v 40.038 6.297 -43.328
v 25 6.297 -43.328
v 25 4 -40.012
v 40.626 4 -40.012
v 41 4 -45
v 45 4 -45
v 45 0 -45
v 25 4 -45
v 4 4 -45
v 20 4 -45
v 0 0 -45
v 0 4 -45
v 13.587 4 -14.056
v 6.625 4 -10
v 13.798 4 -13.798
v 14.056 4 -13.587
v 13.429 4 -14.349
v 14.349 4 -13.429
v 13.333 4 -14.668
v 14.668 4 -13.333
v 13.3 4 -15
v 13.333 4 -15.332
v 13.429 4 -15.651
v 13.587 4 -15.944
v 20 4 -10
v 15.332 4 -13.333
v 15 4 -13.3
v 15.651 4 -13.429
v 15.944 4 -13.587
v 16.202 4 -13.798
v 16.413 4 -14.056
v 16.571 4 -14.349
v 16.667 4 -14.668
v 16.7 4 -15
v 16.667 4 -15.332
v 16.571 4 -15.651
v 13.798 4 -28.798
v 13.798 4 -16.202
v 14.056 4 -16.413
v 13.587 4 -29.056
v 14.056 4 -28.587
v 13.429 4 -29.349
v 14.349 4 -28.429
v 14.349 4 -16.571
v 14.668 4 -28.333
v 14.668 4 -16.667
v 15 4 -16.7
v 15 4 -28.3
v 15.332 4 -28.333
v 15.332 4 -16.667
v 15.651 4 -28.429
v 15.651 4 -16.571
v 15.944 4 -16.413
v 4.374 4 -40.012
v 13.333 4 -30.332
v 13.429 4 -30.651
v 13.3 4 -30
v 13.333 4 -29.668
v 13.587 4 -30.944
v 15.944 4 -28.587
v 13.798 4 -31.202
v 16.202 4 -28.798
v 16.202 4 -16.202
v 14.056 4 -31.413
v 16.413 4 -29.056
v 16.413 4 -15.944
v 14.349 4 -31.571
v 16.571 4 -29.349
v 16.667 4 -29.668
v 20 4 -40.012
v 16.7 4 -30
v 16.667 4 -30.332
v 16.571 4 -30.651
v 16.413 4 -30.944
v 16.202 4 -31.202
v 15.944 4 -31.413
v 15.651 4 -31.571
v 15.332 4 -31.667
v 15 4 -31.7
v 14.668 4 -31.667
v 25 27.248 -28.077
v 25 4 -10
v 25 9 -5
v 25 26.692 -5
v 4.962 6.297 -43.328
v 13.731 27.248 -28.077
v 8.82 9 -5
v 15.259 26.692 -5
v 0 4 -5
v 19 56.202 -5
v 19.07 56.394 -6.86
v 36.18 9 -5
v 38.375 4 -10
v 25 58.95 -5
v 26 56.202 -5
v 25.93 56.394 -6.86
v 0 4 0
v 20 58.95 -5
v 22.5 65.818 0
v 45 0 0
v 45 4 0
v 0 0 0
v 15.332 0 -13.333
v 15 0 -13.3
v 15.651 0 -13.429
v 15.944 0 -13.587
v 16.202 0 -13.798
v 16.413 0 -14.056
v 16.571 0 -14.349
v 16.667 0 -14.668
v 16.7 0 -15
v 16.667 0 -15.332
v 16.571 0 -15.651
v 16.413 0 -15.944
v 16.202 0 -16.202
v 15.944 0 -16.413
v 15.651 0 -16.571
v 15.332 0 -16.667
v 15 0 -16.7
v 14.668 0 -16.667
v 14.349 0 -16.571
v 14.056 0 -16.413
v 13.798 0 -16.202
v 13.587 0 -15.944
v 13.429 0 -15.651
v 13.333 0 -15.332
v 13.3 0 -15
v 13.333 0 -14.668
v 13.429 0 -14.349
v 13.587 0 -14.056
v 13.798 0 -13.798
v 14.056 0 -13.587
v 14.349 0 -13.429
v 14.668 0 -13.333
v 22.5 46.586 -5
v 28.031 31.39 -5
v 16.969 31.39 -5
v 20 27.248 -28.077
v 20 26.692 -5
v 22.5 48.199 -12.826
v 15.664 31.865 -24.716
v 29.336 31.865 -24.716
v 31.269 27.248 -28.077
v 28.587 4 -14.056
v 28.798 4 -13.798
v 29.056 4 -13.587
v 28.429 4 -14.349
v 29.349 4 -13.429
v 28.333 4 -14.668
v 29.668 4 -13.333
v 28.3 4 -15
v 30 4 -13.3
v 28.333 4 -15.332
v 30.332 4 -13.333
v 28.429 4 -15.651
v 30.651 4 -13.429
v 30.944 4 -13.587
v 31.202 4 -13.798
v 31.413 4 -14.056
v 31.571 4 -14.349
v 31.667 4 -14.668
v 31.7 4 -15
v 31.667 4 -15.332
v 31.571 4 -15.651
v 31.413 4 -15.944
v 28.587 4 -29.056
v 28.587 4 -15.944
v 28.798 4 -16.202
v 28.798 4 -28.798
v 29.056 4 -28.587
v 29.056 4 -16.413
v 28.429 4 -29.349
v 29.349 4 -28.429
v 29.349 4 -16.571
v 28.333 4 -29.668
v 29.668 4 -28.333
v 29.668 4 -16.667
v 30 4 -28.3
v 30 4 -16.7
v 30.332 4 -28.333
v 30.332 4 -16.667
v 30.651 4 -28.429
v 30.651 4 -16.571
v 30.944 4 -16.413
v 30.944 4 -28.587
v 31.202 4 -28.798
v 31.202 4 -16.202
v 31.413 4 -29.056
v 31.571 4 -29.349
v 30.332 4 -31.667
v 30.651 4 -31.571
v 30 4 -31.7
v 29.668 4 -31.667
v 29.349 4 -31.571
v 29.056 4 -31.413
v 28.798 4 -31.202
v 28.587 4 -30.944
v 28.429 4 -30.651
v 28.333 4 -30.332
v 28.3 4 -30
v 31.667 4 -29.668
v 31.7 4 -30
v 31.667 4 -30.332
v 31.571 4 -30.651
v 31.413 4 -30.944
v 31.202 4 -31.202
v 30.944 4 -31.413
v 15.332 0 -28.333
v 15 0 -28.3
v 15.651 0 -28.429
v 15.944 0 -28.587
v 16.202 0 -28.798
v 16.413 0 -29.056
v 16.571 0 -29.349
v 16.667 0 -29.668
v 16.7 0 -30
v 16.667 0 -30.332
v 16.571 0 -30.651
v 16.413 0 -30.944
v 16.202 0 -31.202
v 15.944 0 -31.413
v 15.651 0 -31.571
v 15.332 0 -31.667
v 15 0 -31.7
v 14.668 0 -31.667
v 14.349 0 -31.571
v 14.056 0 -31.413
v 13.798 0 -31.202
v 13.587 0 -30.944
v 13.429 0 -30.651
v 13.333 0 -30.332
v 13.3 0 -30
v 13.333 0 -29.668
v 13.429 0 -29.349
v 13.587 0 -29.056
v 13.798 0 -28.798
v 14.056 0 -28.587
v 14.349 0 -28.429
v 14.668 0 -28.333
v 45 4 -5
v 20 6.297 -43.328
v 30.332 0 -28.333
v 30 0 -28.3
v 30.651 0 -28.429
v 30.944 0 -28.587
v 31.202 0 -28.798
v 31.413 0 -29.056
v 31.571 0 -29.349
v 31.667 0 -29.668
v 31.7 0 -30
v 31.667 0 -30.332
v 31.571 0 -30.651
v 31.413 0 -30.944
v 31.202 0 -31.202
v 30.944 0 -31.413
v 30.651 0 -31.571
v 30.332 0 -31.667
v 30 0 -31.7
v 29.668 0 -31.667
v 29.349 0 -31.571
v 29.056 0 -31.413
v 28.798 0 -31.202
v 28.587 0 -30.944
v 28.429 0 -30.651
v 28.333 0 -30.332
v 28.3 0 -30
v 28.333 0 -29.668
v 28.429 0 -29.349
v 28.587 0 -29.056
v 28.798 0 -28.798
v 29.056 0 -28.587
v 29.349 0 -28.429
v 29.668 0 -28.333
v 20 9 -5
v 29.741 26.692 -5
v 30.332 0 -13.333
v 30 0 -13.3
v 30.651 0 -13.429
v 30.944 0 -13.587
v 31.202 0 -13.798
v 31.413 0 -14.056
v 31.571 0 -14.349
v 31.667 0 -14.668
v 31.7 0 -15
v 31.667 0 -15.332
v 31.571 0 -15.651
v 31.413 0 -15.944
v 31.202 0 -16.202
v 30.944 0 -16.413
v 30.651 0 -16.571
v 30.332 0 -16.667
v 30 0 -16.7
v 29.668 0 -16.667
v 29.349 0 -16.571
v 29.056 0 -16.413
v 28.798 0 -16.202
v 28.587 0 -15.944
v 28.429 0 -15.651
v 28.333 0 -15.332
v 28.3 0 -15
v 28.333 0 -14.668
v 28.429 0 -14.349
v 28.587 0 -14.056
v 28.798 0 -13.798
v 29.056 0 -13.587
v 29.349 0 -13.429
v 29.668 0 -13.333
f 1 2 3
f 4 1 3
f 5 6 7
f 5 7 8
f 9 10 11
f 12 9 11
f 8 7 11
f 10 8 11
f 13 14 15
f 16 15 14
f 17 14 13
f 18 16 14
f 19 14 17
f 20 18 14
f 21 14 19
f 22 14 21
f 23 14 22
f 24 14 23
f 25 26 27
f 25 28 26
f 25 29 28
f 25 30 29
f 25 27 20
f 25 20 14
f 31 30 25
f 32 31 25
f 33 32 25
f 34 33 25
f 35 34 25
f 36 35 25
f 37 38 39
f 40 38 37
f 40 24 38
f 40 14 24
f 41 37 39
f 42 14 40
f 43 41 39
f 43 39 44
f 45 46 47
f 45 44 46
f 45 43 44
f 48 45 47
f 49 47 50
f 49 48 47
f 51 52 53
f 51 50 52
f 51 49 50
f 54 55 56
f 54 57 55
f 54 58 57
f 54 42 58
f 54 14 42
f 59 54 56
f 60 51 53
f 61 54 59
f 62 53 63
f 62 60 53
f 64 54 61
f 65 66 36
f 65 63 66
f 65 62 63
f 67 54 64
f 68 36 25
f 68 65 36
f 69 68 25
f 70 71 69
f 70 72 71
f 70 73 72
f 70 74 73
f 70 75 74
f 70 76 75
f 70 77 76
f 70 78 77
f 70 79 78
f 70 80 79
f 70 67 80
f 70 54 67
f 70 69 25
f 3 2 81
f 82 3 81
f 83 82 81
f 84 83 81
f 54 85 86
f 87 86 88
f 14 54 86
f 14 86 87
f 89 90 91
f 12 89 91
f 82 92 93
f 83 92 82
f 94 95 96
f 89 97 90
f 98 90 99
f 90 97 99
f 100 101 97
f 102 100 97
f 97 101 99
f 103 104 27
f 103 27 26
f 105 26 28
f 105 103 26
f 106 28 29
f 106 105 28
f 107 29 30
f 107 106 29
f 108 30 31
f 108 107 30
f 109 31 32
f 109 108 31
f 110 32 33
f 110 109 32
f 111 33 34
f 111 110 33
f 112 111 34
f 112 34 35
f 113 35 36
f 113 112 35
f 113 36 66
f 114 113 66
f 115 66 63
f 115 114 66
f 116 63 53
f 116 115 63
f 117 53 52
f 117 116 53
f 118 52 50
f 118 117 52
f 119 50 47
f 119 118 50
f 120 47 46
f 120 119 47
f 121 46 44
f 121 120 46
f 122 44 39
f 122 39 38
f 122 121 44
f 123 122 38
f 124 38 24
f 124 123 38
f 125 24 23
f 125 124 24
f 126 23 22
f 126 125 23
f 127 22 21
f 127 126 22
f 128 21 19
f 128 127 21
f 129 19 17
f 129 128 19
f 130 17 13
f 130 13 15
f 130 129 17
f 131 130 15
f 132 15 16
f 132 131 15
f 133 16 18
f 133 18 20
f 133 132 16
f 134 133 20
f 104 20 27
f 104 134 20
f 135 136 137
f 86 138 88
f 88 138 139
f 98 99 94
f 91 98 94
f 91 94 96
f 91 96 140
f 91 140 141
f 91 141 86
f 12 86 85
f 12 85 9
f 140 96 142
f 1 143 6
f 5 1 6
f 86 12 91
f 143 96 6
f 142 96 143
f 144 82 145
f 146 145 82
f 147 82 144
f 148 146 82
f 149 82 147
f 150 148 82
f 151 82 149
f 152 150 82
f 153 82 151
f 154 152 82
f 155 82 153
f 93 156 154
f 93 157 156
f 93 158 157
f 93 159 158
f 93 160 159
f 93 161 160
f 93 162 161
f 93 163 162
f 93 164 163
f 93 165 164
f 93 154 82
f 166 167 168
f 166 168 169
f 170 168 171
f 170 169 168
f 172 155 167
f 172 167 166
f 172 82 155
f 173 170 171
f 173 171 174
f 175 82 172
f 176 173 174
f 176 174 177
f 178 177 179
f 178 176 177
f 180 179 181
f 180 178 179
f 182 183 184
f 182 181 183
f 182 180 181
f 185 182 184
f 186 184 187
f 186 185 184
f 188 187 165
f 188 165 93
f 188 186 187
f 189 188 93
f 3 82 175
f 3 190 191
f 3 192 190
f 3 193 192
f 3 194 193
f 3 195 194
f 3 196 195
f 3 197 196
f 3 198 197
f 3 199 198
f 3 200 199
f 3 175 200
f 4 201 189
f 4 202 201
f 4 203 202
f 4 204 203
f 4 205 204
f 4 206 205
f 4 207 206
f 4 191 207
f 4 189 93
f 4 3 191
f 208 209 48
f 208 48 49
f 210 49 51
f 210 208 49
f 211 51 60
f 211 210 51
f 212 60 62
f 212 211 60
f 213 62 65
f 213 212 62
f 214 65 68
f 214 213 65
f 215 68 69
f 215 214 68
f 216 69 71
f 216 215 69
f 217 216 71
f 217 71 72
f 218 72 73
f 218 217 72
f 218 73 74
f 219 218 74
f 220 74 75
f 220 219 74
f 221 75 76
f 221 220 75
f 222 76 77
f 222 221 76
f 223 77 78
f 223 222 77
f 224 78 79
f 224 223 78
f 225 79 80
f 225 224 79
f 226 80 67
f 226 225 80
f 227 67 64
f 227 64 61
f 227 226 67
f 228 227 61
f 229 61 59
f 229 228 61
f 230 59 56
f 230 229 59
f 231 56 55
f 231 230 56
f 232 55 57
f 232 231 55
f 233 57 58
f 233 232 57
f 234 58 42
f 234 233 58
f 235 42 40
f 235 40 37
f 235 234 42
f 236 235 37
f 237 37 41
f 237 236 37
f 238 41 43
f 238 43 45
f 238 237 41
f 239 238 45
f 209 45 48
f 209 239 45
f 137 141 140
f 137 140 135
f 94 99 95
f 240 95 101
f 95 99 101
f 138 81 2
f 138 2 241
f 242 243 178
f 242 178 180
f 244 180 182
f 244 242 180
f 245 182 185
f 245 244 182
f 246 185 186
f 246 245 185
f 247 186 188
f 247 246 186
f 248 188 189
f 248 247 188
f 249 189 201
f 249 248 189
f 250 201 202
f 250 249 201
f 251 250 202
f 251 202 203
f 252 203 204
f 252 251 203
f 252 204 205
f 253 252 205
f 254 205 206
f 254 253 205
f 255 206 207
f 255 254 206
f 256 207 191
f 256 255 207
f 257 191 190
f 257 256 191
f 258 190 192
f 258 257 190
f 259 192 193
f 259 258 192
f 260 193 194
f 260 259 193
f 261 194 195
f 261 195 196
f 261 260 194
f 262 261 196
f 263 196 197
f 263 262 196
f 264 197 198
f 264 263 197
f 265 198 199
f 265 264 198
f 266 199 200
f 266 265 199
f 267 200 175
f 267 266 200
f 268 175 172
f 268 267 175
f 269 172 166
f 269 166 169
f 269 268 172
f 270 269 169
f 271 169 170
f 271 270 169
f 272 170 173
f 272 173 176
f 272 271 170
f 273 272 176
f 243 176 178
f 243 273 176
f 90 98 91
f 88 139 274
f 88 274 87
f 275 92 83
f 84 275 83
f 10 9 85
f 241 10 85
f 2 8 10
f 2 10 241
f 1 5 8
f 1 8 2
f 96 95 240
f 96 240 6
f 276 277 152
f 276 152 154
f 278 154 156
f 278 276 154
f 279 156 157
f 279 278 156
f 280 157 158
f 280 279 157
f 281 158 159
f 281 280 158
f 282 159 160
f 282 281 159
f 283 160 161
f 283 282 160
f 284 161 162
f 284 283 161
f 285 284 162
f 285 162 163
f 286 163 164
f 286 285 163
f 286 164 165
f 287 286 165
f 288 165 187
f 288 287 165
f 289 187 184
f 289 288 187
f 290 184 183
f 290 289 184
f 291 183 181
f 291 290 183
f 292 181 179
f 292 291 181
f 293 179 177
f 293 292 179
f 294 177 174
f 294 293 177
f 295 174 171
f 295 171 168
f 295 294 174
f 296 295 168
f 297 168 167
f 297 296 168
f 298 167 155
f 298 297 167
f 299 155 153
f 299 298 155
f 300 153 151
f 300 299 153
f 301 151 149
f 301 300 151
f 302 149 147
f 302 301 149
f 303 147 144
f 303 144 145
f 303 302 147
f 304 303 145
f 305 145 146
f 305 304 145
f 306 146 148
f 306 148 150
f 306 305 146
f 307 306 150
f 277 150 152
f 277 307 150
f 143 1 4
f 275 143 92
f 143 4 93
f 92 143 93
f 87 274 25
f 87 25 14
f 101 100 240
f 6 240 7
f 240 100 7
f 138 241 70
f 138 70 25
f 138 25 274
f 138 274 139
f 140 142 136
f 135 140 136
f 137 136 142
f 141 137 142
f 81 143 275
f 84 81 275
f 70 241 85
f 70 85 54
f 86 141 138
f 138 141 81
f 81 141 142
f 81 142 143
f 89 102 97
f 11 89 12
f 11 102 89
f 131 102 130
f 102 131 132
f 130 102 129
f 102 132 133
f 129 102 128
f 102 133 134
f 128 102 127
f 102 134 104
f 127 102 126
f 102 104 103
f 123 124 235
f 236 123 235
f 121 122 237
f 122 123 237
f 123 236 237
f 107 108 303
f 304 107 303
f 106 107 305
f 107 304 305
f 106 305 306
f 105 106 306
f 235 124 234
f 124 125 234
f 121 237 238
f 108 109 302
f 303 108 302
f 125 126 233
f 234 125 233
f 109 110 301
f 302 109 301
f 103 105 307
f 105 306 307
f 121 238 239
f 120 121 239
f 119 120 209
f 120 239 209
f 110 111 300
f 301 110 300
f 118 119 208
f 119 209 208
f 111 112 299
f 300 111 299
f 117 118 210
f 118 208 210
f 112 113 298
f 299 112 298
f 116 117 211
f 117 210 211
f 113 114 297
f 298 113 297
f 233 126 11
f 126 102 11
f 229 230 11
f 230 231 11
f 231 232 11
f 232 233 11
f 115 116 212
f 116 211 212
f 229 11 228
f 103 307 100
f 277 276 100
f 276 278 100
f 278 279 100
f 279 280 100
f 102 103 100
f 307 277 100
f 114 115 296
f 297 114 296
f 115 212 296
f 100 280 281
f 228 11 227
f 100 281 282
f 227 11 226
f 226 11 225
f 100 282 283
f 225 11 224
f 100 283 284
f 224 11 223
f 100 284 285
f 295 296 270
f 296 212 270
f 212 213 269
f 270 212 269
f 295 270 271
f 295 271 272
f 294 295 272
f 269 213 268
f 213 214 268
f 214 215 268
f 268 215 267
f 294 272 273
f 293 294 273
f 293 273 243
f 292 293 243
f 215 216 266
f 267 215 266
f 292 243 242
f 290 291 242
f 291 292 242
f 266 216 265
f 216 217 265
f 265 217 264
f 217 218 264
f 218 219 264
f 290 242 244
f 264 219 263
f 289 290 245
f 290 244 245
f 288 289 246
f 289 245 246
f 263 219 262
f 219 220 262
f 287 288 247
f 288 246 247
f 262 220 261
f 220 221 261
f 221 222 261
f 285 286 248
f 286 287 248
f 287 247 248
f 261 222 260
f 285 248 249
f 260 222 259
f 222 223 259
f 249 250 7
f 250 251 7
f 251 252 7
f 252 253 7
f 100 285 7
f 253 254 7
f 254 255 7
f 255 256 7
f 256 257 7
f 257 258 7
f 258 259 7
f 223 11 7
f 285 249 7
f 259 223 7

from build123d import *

# Parameters (mm, degrees)
SKETCH_1_W          = 45
SKETCH_1_H          = 45
SKETCH_1_R          = 1.7
EXTRUDE_1_DEPTH     = 4
EXTRUDE_2_DEPTH     = 5
EXTRUDE_3_DEPTH     = 65.785596942
EXTRUDE_4_DEPTH     = 65.785596942
CUT_EXTRUDE_1_DEPTH = 92.553486945
CUT_EXTRUDE_2_DEPTH = 85.512691631
EXTRUDE_9_REACH     = 86.713
CHAMFER_1_SIZE      = 5
EXTRUDE_10_REACH    = 86.713
EXTRUDE_11_REACH    = 88.671
SKETCH_13_W         = 5
SKETCH_13_H         = 28.755225939


with BuildPart() as part:
    # 草图1 → 凸台-拉伸1 (new body)
    with BuildSketch(Plane(origin=(0, 0, 0), x_dir=(1, 0, 0), z_dir=(0, 1, 0))):
        with Locations((22.5, 22.5)):
            Rectangle(SKETCH_1_W, SKETCH_1_H)
        with Locations(Location((15, 30, 0), (0, 0, 270))):
            Circle(SKETCH_1_R, mode=Mode.SUBTRACT)
        with Locations(Location((30, 30, 0), (0, 0, 270))):
            Circle(SKETCH_1_R, mode=Mode.SUBTRACT)
        with Locations(Location((15, 15, 0), (0, 0, 270))):
            Circle(SKETCH_1_R, mode=Mode.SUBTRACT)
        with Locations(Location((30, 15, 0), (0, 0, 270))):
            Circle(SKETCH_1_R, mode=Mode.SUBTRACT)
    extrude(amount=EXTRUDE_1_DEPTH)

    # 草图2 → 凸台-拉伸2 (add)
    with BuildSketch(Plane.XY):
        Polygon((0, 4), (22.5, 65.818241938), (45, 4), align=None)
    extrude(amount=-EXTRUDE_2_DEPTH)

    # 草图3 → 凸台-拉伸3 (add, along a direction that is not the sketch's normal)
    with BuildSketch(Plane(origin=(0, 4, 0), x_dir=(1, 0, 0), z_dir=(0, 1, 0))):
        Polygon((0, 5), (0, 45), (4, 45), (7, 5), align=None)
    extrude(amount=EXTRUDE_3_DEPTH, dir=(0.34202014332566566, 0.9396926207859095, 0))

    # 草图4 → 凸台-拉伸4 (add, along a direction that is not the sketch's normal)
    with BuildSketch(Plane(origin=(0, 4, 0), x_dir=(1, 0, 0), z_dir=(0, 1, 0))):
        Polygon((45, 45), (41, 45), (38, 5), (45, 5), align=None)
    extrude(amount=EXTRUDE_4_DEPTH, dir=(-0.3420201433256661, 0.9396926207859094, 0))

    # 草图5 → 切除-拉伸1 (cut, through all)
    with BuildSketch(Plane.XY):
        Polygon((22.5, 65.818241938), (19, 56.20207097), (11, 56.20207097), (11, 66.20207097), (34, 66.20207097), (34, 56.20207097), (26, 56.20207097), align=None)
    extrude(amount=-CUT_EXTRUDE_1_DEPTH, mode=Mode.SUBTRACT)

    # 草图6 → 切除-拉伸2 (cut, through all, along a direction that is not the sketch's normal)
    with BuildSketch(Plane(origin=(41.02157519, 14.930632332, 0), x_dir=(0, 0, -1), z_dir=(0.9396926207859093, 0.3420201433256662, 0))):
        Polygon((0, 54.153463037), (45, -11.632135967), (45, 54.153463037), align=None)
    extrude(amount=-CUT_EXTRUDE_2_DEPTH, dir=(1, 0, 0), mode=Mode.SUBTRACT)

    # 凸台-拉伸9: up to this plane
    extrude_9_end = Plane(origin=(26.5, 65.818241938, -45), z_dir=(-0.9373675520499937, 0.34117388751316935, 0.07030256640374952))
    # 草图8 → 凸台-拉伸9 (add, up to the surface)
    with BuildSketch(Plane(origin=(34.338725854, 12.498274094, 2.575404439), x_dir=(-0.06606280287191471, -0.024044893837572568, 0.9975257135317598), z_dir=(-0.9373675520499937, -0.34117388751316985, -0.07030256640374943)), mode=Mode.PRIVATE) as extrude_9_sk1:
        Polygon((-47.693411602, -10.264055393), (-46.016852855, -7.776255006), (-42.693411602, -10.136115185), align=None)
    extrude_9_tool1 = split(extrude(extrude_9_sk1.sketch, amount=EXTRUDE_9_REACH, dir=(-1, 0, 0), mode=Mode.PRIVATE), bisect_by=extrude_9_end, keep=Keep.BOTH, mode=Mode.PRIVATE)
    add(extrude_9_tool1.solids().sort_by_distance((40.554764, 4.765818, -42.779987))[0])

    # 倒角1
    chamfer_1_edges = [part.edges().sort_by_distance(p)[0] for p in [
        (22.5, 4, -5),
    ]]
    chamfer(chamfer_1_edges, length=CHAMFER_1_SIZE)

    # 凸台-拉伸10: up to this plane
    extrude_10_end = Plane(origin=(26.5, 65.818241938, -45), z_dir=(-0.9373675520499937, 0.34117388751316935, 0.07030256640374952))
    # 草图10 → 凸台-拉伸10 (add, up to the surface)
    with BuildSketch(Plane(origin=(34.338725854, 12.498274094, 2.575404439), x_dir=(-0.06606280287191474, -0.024044893837572537, 0.9975257135317598), z_dir=(-0.9373675520499936, -0.34117388751316985, -0.07030256640374943)), mode=Mode.PRIVATE) as extrude_10_sk1:
        Polygon((-27.358712809, 19.91005667), (-30.728273238, 14.91005667), (-7.594194652, 14.91005667), (-7.594194652, 19.91005667), align=None)
    extrude_10_tool1 = split(extrude(extrude_10_sk1.sketch, amount=EXTRUDE_10_REACH, dir=(-1, 0, 0), mode=Mode.PRIVATE), bisect_by=extrude_10_end, keep=Keep.BOTH, mode=Mode.PRIVATE)
    add(extrude_10_tool1.solids().sort_by_distance((29.618174, 29.237872, -15.720115))[0])

    # 凸台-拉伸11: up to this plane
    extrude_11_end = Plane(origin=(0, 0, -5), z_dir=(0, 0, -1))
    # 草图13 → 凸台-拉伸11 (add, up to the surface)
    with BuildSketch(Plane(origin=(0, 22.796896106, -31.316978642), x_dir=(-1, 0, 0), z_dir=(0, 0.5885247359201023, -0.8084792113654956)), mode=Mode.PRIVATE) as extrude_11_sk1:
        with Locations((-22.5, -8.872083302)):
            Rectangle(SKETCH_13_W, SKETCH_13_H)
    extrude_11_tool1 = split(extrude(extrude_11_sk1.sketch, amount=EXTRUDE_11_REACH, dir=(0, 0, 1), mode=Mode.PRIVATE), bisect_by=extrude_11_end, keep=Keep.BOTH, mode=Mode.PRIVATE)
    add(extrude_11_tool1.solids().sort_by_distance((22.5, 15.624001, -36.538419))[0])


solid = part.part
